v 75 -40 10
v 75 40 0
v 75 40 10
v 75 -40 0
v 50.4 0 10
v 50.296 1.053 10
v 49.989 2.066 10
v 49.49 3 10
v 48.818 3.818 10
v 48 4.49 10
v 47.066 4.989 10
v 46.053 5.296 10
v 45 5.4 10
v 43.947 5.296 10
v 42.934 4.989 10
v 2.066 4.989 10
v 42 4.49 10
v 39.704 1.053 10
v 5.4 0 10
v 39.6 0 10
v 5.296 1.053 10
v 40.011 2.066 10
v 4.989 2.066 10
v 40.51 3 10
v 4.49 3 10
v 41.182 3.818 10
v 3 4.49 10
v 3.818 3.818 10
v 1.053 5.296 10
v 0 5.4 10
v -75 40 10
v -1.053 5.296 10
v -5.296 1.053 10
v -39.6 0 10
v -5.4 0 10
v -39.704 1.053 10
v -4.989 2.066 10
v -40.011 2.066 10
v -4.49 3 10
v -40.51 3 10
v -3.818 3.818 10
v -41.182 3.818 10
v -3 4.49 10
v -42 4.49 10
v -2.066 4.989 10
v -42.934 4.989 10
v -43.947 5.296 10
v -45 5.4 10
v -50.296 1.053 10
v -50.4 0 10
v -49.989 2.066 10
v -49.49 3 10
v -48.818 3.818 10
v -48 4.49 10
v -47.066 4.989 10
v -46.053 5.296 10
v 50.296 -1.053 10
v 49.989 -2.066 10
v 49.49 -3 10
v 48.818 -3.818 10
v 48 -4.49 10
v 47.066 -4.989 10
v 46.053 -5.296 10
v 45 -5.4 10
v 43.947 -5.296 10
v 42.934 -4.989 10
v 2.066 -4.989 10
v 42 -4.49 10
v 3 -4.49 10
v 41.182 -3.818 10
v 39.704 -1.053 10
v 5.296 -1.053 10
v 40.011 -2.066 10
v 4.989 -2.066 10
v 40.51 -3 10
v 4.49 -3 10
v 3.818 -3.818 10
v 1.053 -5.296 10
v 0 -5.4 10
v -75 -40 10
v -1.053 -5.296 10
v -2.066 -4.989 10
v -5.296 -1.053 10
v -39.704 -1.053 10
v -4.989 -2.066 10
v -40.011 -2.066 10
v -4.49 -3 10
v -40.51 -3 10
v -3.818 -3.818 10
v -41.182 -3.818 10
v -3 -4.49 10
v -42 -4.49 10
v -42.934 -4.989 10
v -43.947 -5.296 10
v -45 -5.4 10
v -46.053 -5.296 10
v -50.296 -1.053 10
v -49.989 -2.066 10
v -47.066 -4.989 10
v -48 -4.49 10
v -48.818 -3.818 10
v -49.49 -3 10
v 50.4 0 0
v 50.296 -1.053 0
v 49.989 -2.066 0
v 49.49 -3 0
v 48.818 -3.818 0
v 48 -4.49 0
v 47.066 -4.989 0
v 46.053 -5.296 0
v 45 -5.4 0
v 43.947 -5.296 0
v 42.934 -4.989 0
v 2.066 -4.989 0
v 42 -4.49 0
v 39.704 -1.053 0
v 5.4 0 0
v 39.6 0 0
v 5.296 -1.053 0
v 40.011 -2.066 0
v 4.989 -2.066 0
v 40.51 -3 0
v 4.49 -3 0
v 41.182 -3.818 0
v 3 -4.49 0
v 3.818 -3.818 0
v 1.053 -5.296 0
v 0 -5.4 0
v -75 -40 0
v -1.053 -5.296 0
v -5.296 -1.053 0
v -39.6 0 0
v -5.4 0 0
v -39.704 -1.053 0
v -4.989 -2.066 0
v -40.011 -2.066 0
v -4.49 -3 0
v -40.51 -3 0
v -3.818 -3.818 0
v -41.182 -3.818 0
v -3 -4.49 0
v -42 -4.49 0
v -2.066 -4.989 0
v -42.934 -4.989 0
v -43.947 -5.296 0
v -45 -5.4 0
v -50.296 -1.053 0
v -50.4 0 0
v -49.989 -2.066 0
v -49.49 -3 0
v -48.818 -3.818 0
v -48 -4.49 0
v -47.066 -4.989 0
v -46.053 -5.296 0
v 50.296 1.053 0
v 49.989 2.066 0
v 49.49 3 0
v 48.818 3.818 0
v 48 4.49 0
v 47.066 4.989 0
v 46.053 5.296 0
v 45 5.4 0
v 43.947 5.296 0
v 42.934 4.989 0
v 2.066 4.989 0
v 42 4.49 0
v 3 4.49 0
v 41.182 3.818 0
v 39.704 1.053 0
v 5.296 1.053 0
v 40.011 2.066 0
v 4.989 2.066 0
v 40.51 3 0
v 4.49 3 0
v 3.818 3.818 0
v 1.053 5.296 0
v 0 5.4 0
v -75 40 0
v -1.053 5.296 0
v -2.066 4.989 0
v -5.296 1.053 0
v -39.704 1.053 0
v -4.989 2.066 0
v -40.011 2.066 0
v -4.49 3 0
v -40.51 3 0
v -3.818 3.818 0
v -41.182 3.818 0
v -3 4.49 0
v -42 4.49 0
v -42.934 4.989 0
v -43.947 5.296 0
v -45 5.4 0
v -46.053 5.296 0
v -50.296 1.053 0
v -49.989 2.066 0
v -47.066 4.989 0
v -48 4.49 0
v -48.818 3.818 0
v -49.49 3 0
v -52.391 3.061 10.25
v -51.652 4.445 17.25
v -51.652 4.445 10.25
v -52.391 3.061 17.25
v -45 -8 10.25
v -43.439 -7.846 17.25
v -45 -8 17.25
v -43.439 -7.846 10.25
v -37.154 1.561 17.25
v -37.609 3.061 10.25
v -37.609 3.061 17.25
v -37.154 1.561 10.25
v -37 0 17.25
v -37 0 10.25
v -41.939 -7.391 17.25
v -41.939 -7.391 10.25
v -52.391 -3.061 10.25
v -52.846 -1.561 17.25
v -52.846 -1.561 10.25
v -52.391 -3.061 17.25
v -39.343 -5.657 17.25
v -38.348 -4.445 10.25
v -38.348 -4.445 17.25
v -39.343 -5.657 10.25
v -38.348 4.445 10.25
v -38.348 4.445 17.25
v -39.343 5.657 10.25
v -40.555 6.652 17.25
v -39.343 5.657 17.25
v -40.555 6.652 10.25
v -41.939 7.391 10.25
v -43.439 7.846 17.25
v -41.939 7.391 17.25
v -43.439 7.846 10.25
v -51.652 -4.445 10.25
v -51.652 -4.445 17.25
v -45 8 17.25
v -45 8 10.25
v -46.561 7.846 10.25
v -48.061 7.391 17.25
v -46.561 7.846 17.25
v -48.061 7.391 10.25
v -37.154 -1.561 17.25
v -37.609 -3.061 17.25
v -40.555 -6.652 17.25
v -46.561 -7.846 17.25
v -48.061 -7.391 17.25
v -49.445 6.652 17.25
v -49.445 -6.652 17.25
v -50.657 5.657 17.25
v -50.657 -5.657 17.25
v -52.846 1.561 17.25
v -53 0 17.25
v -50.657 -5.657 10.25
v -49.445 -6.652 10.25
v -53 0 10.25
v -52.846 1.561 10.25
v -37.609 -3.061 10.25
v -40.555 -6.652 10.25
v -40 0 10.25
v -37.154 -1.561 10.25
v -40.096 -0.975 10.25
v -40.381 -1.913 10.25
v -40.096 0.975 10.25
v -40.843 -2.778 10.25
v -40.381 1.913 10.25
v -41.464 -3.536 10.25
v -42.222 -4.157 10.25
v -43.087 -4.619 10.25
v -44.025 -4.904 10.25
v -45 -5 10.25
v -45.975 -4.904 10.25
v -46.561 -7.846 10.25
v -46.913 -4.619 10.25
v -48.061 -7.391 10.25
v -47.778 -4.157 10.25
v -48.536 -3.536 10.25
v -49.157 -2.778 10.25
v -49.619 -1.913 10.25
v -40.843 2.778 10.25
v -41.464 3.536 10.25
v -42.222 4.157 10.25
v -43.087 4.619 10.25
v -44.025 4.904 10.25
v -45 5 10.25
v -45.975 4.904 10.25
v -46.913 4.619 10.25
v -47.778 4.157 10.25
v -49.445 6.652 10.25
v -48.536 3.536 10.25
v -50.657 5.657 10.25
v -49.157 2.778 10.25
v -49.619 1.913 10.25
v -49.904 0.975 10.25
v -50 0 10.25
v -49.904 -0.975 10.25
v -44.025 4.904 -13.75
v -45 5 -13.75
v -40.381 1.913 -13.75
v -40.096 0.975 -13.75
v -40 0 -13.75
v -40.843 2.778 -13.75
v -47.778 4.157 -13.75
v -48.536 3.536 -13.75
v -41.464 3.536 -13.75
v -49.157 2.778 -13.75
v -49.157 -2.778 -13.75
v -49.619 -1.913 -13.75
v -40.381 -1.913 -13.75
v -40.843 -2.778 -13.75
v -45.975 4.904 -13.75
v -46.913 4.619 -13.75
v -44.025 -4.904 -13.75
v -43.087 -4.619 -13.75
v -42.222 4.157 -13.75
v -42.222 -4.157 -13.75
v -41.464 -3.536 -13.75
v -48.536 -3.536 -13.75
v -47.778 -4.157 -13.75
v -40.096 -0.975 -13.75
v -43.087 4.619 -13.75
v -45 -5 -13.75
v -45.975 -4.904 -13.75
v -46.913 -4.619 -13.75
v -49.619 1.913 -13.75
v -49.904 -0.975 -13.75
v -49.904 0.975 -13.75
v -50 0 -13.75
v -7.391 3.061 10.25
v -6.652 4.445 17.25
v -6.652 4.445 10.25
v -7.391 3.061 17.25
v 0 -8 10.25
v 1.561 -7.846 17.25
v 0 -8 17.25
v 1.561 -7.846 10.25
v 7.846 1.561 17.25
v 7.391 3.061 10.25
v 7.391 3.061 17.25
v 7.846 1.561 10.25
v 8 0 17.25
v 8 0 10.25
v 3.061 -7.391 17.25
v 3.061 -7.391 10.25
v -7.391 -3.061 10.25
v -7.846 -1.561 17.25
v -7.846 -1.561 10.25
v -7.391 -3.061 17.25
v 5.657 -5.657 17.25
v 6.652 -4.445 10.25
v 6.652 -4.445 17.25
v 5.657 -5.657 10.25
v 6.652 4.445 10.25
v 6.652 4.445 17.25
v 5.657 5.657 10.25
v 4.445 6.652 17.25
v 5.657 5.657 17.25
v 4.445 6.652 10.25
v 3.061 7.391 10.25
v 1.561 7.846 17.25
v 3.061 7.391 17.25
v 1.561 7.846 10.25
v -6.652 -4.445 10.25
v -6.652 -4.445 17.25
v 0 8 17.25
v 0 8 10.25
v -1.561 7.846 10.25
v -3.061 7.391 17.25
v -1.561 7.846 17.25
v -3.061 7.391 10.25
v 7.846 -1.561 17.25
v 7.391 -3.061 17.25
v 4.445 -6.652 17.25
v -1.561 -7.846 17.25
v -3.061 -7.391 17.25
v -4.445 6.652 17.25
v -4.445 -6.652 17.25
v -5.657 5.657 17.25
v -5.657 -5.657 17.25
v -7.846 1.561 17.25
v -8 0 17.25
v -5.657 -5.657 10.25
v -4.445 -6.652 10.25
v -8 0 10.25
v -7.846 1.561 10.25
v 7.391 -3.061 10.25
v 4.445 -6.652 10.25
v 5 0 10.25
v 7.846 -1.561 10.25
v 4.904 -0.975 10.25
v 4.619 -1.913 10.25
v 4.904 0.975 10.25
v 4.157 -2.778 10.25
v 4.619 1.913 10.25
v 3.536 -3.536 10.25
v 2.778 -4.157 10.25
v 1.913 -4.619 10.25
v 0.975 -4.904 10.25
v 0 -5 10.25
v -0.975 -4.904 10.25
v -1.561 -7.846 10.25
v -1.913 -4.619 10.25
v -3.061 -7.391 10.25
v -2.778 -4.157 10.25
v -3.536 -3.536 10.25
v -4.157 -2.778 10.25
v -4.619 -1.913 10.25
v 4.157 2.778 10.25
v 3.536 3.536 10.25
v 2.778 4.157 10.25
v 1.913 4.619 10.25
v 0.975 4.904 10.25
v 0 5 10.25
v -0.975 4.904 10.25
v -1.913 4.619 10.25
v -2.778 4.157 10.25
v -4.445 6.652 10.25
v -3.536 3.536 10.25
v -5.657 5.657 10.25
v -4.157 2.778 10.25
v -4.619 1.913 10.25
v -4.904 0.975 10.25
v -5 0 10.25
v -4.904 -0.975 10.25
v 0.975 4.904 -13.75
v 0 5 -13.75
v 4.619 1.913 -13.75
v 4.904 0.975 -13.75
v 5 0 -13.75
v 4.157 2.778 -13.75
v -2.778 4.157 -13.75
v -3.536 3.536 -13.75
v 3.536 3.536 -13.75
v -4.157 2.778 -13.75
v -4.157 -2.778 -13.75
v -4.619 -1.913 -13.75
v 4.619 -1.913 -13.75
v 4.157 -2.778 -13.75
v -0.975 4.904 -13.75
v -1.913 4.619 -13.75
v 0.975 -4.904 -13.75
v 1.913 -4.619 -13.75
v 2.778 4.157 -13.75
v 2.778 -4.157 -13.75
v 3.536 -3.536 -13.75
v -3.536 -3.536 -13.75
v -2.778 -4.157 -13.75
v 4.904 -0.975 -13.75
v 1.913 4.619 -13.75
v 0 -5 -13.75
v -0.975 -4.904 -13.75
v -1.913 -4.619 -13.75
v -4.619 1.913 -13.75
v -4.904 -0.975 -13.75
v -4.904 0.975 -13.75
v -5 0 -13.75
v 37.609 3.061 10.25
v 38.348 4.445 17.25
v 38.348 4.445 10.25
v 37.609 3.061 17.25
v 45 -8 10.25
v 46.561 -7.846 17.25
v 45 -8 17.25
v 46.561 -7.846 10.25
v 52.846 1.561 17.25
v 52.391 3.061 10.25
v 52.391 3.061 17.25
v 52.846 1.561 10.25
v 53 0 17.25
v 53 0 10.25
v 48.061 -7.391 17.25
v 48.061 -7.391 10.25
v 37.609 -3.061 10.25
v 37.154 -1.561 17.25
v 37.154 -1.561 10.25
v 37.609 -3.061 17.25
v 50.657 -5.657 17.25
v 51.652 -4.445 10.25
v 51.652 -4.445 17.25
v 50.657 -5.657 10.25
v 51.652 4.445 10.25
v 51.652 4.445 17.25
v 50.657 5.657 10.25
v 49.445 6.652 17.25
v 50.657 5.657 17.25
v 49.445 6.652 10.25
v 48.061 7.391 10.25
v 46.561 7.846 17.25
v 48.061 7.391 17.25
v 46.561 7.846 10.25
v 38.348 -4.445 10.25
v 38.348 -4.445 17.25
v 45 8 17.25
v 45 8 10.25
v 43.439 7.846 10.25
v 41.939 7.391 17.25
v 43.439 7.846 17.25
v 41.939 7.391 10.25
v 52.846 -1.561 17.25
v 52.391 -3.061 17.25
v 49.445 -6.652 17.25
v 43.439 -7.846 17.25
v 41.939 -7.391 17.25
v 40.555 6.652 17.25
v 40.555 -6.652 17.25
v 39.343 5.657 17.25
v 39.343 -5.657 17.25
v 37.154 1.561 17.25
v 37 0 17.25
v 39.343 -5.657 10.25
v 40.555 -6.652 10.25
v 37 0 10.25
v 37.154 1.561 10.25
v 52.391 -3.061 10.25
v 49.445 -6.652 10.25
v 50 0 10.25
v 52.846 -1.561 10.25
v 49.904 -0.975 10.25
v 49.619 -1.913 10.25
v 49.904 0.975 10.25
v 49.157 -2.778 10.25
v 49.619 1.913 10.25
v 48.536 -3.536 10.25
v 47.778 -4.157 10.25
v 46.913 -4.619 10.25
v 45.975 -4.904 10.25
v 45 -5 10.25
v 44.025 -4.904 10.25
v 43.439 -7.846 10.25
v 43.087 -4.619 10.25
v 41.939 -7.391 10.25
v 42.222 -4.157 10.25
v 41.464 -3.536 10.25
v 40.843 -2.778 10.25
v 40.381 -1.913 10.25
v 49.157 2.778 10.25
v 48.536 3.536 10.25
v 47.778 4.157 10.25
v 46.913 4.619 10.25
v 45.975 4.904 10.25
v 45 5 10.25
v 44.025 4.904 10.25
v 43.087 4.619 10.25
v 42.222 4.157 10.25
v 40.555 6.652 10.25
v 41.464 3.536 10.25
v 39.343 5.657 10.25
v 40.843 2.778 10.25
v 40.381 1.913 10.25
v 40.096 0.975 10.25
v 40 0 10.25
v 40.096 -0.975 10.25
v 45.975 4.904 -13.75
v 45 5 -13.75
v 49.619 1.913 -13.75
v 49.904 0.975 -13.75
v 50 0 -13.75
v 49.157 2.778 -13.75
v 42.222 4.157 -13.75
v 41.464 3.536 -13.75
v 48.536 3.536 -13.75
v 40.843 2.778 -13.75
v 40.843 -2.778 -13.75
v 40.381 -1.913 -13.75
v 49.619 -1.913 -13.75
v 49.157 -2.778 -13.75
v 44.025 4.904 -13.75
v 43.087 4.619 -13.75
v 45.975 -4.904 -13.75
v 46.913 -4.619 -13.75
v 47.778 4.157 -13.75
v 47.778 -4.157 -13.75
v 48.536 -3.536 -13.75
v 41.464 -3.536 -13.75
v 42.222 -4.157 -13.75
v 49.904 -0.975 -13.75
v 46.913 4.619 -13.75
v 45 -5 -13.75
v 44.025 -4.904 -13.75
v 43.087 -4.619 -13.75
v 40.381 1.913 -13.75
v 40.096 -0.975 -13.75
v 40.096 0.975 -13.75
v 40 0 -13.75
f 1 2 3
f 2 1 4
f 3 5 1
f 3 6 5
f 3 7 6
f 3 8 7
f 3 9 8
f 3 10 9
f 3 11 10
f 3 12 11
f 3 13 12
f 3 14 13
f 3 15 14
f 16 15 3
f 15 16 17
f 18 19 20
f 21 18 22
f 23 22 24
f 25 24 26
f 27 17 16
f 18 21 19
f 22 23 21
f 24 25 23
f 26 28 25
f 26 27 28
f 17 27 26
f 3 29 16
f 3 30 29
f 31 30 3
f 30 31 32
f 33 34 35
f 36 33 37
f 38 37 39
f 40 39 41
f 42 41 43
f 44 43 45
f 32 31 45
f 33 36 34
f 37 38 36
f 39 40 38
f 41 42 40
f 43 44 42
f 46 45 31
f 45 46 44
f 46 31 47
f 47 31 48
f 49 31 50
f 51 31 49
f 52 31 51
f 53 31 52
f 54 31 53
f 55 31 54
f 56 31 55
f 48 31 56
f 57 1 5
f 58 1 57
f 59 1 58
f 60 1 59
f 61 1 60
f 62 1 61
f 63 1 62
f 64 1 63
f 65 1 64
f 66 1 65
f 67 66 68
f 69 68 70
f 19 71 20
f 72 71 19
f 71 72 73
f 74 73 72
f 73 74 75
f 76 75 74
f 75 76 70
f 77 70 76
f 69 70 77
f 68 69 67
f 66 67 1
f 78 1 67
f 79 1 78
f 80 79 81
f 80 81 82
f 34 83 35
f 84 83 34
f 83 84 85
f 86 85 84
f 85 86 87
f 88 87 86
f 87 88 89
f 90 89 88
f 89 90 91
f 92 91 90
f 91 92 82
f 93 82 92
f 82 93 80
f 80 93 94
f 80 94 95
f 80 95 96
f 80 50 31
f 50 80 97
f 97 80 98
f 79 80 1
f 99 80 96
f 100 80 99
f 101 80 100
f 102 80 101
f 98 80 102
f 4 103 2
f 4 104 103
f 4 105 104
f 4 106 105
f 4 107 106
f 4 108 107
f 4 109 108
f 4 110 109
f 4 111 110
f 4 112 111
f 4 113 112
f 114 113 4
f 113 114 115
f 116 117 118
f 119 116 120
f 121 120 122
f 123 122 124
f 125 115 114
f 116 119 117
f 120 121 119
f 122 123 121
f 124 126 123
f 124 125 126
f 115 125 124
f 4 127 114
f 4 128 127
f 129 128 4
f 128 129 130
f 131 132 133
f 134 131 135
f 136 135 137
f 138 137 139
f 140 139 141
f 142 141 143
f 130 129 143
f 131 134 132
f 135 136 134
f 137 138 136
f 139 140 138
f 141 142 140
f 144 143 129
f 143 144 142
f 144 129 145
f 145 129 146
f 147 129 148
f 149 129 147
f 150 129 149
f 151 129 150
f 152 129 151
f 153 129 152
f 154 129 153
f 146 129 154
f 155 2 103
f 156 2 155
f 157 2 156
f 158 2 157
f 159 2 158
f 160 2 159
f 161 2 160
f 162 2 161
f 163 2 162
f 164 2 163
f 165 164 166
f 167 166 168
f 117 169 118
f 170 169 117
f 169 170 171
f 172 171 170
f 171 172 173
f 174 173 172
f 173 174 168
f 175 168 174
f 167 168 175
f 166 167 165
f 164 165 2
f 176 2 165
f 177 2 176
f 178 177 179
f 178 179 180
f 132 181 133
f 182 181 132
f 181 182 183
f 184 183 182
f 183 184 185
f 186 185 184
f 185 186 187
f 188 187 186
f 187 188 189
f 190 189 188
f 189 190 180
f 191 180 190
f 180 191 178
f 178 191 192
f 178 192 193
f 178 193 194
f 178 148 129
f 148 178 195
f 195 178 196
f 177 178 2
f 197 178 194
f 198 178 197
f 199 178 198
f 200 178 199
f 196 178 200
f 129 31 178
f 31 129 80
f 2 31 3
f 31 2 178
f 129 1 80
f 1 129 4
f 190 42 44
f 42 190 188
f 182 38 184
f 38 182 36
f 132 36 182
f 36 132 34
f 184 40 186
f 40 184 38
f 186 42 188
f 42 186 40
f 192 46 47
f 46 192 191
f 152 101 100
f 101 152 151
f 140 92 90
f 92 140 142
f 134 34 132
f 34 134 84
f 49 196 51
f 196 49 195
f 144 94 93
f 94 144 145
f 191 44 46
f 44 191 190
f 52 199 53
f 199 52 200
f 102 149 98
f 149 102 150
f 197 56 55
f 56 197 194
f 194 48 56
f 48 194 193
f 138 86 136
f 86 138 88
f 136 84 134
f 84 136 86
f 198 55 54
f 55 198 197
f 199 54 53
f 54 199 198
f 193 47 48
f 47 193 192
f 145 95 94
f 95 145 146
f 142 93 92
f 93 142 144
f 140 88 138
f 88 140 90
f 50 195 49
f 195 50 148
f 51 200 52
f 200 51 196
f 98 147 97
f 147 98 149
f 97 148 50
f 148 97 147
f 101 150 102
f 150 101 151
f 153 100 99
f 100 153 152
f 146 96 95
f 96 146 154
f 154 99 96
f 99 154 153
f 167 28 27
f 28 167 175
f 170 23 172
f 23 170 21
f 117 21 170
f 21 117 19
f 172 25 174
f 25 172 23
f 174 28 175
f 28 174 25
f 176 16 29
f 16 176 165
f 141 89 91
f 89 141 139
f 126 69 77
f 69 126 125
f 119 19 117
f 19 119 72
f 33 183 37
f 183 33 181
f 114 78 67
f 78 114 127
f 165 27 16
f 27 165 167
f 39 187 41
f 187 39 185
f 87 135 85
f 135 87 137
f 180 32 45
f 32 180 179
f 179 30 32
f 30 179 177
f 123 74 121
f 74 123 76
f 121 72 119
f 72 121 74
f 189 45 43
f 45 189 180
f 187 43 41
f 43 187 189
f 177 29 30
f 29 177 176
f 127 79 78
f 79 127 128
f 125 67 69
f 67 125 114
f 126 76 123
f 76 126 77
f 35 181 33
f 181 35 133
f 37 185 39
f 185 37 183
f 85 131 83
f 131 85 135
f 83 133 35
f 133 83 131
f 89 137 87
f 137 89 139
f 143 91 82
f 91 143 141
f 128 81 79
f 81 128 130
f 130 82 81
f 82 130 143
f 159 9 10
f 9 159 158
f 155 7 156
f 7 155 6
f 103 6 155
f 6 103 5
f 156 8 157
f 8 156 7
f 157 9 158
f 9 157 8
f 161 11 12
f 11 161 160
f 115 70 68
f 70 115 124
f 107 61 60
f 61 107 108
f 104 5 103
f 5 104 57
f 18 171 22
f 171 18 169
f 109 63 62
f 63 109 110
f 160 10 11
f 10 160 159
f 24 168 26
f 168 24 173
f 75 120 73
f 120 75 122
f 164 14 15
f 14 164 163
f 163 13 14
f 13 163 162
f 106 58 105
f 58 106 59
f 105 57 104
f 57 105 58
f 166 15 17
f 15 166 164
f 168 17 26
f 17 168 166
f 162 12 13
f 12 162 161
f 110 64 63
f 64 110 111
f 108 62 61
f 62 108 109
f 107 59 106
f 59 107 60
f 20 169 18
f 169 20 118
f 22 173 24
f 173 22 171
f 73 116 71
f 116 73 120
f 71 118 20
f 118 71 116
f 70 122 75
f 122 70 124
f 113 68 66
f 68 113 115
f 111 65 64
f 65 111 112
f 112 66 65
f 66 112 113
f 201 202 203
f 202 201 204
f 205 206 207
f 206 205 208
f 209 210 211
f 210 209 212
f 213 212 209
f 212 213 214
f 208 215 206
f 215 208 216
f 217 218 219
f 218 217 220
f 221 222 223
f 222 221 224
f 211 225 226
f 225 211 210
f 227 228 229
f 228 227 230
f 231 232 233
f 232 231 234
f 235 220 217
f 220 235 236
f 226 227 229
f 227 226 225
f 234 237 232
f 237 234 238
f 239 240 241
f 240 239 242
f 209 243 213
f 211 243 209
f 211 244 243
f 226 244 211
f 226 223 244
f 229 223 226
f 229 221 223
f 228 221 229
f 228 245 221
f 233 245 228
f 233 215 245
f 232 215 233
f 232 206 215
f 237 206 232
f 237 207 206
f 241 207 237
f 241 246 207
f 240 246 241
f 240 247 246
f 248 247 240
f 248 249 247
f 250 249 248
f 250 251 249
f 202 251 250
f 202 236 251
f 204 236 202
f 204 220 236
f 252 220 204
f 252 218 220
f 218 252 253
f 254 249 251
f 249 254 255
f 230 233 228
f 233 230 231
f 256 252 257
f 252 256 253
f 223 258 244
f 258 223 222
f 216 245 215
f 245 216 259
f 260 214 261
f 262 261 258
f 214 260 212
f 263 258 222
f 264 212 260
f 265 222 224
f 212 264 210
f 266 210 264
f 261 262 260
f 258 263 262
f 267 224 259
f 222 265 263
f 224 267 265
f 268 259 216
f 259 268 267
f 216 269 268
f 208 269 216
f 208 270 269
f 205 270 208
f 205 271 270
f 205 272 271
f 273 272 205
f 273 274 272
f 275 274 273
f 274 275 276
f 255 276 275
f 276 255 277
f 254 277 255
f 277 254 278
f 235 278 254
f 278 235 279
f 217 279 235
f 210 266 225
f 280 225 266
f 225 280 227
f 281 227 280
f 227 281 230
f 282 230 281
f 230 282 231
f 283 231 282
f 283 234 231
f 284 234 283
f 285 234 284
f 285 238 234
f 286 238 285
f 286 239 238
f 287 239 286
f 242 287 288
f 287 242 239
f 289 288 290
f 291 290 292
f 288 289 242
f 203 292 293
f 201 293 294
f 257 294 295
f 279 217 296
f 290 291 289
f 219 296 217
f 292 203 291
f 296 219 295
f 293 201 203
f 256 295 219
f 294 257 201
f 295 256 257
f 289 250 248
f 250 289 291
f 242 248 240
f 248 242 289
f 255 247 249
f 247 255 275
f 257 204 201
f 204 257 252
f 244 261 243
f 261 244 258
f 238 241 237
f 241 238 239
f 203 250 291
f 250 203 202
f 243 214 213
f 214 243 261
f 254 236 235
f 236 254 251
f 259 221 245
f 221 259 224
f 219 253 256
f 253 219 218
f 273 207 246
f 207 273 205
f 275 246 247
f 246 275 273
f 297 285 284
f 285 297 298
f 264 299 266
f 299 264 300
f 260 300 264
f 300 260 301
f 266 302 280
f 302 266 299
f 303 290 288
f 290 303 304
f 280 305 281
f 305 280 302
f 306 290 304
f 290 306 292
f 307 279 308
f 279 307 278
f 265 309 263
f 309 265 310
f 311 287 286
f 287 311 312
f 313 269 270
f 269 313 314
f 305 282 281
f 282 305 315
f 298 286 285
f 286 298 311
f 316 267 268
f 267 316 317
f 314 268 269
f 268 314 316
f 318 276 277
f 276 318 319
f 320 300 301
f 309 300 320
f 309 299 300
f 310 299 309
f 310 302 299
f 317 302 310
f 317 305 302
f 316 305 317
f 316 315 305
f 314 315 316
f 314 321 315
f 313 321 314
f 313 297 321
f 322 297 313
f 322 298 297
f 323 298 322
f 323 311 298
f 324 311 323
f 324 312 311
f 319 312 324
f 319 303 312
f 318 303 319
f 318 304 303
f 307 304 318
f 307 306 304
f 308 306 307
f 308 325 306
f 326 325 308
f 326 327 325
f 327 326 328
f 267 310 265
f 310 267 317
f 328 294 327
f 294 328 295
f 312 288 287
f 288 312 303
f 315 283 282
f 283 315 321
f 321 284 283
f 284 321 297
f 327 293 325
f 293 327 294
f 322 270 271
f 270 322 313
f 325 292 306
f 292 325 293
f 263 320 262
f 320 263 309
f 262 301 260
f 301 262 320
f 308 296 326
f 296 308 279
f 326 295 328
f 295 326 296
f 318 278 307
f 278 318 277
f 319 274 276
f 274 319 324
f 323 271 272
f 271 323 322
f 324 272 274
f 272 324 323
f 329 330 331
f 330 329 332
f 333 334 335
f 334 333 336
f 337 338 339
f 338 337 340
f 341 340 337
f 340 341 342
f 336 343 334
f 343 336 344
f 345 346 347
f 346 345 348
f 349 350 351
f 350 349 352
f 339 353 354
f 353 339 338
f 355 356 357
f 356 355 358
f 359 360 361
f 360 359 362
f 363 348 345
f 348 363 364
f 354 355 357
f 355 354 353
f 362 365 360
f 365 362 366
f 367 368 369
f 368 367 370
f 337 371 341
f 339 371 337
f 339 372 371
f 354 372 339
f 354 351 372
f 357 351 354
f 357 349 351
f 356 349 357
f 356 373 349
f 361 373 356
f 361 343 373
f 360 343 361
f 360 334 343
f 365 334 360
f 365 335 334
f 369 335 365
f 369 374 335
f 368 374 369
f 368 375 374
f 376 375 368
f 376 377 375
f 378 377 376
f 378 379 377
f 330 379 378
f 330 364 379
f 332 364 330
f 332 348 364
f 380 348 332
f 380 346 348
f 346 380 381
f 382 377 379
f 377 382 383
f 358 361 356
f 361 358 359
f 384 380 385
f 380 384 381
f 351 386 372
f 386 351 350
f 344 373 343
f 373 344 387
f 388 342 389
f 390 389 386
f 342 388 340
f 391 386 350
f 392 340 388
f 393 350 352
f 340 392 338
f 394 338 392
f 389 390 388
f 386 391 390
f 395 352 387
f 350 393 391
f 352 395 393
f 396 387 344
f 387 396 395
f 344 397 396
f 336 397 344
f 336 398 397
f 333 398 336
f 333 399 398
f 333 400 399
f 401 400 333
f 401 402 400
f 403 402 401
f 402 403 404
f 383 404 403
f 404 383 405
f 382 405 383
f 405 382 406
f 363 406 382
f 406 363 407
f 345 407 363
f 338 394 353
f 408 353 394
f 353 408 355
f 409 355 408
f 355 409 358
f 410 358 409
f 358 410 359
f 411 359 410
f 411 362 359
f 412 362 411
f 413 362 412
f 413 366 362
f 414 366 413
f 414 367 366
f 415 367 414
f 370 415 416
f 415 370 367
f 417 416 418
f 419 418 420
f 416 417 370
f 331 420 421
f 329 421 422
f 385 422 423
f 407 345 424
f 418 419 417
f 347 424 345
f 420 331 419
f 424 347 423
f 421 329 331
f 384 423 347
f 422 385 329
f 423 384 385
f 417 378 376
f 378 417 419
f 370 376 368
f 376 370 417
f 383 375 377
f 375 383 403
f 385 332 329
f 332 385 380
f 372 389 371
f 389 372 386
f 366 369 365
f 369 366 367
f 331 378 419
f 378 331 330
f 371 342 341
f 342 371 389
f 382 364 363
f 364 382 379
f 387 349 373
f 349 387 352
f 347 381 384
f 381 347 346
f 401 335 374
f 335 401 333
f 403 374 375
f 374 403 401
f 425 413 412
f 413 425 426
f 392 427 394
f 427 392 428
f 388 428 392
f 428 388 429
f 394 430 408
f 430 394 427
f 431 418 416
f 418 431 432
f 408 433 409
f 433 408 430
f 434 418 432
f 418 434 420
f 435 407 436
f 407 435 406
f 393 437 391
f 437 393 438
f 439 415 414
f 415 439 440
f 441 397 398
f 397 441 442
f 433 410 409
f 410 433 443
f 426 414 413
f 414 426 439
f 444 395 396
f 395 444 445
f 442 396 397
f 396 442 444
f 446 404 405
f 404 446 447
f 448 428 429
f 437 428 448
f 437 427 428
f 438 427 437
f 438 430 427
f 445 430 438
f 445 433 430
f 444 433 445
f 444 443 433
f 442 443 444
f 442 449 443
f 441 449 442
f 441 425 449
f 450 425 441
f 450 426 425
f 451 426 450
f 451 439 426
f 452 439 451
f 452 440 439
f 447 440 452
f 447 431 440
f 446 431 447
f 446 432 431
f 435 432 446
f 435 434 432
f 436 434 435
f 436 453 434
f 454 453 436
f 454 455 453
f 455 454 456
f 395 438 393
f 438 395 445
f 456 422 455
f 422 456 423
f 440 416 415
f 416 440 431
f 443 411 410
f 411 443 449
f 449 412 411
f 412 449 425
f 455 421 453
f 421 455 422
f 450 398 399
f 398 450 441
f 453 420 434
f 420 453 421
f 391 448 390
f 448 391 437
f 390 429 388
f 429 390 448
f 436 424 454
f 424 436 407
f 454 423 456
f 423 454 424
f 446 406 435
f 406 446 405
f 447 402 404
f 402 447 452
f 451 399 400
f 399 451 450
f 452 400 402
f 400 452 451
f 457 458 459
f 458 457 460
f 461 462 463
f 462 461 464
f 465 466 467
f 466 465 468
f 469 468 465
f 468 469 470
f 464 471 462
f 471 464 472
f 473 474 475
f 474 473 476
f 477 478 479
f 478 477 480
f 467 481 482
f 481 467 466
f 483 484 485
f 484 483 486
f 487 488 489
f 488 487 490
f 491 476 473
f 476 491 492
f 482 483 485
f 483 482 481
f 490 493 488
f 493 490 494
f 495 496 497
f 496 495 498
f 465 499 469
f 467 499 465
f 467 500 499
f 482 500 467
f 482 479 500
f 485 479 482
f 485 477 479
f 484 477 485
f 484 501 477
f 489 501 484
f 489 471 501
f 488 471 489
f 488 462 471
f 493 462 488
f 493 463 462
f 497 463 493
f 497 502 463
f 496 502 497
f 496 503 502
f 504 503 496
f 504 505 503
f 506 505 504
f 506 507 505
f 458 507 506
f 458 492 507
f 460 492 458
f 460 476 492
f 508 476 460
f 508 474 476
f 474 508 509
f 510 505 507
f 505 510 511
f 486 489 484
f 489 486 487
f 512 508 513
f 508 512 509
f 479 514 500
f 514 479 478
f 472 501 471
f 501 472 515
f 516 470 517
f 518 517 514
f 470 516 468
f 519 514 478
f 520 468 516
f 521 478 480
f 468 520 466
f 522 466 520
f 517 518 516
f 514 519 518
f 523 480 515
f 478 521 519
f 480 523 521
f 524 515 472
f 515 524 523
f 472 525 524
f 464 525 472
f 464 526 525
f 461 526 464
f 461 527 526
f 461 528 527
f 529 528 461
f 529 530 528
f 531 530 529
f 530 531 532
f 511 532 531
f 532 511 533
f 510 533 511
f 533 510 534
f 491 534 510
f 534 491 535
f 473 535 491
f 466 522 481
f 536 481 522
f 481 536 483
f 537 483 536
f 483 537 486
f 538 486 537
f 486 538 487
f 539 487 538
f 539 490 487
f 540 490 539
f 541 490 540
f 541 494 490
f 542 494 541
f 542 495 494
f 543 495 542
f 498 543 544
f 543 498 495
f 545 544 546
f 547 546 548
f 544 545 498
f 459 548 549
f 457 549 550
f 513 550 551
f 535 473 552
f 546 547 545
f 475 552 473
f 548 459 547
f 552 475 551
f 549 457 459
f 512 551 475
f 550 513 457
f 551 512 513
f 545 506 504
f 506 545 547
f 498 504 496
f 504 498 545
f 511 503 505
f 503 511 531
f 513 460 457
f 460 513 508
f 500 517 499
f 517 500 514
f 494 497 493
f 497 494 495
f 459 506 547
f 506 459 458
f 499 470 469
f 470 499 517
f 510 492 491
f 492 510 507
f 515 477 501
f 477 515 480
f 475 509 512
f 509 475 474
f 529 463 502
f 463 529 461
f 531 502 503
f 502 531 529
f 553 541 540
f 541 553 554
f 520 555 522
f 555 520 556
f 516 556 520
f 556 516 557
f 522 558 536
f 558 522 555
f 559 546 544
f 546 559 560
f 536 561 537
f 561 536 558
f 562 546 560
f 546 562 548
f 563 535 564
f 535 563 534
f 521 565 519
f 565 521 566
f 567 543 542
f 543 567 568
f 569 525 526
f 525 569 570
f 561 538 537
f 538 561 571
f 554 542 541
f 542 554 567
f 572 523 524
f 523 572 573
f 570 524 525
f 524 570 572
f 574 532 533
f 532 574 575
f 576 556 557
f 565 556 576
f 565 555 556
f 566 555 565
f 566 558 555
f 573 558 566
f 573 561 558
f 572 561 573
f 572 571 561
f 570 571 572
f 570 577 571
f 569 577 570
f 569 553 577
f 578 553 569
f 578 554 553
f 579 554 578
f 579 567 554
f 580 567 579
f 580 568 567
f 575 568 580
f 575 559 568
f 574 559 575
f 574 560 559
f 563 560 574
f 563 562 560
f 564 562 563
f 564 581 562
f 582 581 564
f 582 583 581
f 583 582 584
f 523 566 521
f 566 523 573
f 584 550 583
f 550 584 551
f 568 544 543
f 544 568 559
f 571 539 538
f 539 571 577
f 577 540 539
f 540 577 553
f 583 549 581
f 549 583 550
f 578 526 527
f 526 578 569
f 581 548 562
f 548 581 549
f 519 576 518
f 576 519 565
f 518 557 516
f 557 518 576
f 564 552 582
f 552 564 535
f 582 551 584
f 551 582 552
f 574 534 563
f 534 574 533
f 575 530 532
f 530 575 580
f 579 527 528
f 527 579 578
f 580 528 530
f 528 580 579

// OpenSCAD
$fn = 32;

// ------------------------------------------------------------------------
// Bolted plate: 150 x 80 x 10 mm plate, 3 fasteners
// Every part is its own module, assembly() places them once.
// ------------------------------------------------------------------------

// --- part 1 ---
module plate() {
  difference() {
    translate([-75, -40, 0]) cube([150, 80, 10]);
    translate([-45, 0, -1]) cylinder(h = 12, d = 10.8);
    translate([0, 0, -1]) cylinder(h = 12, d = 10.8);
    translate([45, 0, -1]) cylinder(h = 12, d = 10.8);
  }
}

// --- part 2 ---
module bolt1() {
  cylinder(h = 7, d = 16);
  translate([0, 0, -24]) cylinder(h = 24, d = 10);
}

// --- part 3 ---
module bolt2() {
  cylinder(h = 7, d = 16);
  translate([0, 0, -24]) cylinder(h = 24, d = 10);
}

// --- part 4 ---
module bolt3() {
  cylinder(h = 7, d = 16);
  translate([0, 0, -24]) cylinder(h = 24, d = 10);
}

// --- assembly ---
module assembly() {
  translate([0, 0, 0]) rotate([0, 0, 0]) plate();
  translate([-45, 0, 10.25]) rotate([0, 0, 0]) bolt1();
  translate([0, 0, 10.25]) rotate([0, 0, 0]) bolt2();
  translate([45, 0, 10.25]) rotate([0, 0, 0]) bolt3();
}

assembly();
